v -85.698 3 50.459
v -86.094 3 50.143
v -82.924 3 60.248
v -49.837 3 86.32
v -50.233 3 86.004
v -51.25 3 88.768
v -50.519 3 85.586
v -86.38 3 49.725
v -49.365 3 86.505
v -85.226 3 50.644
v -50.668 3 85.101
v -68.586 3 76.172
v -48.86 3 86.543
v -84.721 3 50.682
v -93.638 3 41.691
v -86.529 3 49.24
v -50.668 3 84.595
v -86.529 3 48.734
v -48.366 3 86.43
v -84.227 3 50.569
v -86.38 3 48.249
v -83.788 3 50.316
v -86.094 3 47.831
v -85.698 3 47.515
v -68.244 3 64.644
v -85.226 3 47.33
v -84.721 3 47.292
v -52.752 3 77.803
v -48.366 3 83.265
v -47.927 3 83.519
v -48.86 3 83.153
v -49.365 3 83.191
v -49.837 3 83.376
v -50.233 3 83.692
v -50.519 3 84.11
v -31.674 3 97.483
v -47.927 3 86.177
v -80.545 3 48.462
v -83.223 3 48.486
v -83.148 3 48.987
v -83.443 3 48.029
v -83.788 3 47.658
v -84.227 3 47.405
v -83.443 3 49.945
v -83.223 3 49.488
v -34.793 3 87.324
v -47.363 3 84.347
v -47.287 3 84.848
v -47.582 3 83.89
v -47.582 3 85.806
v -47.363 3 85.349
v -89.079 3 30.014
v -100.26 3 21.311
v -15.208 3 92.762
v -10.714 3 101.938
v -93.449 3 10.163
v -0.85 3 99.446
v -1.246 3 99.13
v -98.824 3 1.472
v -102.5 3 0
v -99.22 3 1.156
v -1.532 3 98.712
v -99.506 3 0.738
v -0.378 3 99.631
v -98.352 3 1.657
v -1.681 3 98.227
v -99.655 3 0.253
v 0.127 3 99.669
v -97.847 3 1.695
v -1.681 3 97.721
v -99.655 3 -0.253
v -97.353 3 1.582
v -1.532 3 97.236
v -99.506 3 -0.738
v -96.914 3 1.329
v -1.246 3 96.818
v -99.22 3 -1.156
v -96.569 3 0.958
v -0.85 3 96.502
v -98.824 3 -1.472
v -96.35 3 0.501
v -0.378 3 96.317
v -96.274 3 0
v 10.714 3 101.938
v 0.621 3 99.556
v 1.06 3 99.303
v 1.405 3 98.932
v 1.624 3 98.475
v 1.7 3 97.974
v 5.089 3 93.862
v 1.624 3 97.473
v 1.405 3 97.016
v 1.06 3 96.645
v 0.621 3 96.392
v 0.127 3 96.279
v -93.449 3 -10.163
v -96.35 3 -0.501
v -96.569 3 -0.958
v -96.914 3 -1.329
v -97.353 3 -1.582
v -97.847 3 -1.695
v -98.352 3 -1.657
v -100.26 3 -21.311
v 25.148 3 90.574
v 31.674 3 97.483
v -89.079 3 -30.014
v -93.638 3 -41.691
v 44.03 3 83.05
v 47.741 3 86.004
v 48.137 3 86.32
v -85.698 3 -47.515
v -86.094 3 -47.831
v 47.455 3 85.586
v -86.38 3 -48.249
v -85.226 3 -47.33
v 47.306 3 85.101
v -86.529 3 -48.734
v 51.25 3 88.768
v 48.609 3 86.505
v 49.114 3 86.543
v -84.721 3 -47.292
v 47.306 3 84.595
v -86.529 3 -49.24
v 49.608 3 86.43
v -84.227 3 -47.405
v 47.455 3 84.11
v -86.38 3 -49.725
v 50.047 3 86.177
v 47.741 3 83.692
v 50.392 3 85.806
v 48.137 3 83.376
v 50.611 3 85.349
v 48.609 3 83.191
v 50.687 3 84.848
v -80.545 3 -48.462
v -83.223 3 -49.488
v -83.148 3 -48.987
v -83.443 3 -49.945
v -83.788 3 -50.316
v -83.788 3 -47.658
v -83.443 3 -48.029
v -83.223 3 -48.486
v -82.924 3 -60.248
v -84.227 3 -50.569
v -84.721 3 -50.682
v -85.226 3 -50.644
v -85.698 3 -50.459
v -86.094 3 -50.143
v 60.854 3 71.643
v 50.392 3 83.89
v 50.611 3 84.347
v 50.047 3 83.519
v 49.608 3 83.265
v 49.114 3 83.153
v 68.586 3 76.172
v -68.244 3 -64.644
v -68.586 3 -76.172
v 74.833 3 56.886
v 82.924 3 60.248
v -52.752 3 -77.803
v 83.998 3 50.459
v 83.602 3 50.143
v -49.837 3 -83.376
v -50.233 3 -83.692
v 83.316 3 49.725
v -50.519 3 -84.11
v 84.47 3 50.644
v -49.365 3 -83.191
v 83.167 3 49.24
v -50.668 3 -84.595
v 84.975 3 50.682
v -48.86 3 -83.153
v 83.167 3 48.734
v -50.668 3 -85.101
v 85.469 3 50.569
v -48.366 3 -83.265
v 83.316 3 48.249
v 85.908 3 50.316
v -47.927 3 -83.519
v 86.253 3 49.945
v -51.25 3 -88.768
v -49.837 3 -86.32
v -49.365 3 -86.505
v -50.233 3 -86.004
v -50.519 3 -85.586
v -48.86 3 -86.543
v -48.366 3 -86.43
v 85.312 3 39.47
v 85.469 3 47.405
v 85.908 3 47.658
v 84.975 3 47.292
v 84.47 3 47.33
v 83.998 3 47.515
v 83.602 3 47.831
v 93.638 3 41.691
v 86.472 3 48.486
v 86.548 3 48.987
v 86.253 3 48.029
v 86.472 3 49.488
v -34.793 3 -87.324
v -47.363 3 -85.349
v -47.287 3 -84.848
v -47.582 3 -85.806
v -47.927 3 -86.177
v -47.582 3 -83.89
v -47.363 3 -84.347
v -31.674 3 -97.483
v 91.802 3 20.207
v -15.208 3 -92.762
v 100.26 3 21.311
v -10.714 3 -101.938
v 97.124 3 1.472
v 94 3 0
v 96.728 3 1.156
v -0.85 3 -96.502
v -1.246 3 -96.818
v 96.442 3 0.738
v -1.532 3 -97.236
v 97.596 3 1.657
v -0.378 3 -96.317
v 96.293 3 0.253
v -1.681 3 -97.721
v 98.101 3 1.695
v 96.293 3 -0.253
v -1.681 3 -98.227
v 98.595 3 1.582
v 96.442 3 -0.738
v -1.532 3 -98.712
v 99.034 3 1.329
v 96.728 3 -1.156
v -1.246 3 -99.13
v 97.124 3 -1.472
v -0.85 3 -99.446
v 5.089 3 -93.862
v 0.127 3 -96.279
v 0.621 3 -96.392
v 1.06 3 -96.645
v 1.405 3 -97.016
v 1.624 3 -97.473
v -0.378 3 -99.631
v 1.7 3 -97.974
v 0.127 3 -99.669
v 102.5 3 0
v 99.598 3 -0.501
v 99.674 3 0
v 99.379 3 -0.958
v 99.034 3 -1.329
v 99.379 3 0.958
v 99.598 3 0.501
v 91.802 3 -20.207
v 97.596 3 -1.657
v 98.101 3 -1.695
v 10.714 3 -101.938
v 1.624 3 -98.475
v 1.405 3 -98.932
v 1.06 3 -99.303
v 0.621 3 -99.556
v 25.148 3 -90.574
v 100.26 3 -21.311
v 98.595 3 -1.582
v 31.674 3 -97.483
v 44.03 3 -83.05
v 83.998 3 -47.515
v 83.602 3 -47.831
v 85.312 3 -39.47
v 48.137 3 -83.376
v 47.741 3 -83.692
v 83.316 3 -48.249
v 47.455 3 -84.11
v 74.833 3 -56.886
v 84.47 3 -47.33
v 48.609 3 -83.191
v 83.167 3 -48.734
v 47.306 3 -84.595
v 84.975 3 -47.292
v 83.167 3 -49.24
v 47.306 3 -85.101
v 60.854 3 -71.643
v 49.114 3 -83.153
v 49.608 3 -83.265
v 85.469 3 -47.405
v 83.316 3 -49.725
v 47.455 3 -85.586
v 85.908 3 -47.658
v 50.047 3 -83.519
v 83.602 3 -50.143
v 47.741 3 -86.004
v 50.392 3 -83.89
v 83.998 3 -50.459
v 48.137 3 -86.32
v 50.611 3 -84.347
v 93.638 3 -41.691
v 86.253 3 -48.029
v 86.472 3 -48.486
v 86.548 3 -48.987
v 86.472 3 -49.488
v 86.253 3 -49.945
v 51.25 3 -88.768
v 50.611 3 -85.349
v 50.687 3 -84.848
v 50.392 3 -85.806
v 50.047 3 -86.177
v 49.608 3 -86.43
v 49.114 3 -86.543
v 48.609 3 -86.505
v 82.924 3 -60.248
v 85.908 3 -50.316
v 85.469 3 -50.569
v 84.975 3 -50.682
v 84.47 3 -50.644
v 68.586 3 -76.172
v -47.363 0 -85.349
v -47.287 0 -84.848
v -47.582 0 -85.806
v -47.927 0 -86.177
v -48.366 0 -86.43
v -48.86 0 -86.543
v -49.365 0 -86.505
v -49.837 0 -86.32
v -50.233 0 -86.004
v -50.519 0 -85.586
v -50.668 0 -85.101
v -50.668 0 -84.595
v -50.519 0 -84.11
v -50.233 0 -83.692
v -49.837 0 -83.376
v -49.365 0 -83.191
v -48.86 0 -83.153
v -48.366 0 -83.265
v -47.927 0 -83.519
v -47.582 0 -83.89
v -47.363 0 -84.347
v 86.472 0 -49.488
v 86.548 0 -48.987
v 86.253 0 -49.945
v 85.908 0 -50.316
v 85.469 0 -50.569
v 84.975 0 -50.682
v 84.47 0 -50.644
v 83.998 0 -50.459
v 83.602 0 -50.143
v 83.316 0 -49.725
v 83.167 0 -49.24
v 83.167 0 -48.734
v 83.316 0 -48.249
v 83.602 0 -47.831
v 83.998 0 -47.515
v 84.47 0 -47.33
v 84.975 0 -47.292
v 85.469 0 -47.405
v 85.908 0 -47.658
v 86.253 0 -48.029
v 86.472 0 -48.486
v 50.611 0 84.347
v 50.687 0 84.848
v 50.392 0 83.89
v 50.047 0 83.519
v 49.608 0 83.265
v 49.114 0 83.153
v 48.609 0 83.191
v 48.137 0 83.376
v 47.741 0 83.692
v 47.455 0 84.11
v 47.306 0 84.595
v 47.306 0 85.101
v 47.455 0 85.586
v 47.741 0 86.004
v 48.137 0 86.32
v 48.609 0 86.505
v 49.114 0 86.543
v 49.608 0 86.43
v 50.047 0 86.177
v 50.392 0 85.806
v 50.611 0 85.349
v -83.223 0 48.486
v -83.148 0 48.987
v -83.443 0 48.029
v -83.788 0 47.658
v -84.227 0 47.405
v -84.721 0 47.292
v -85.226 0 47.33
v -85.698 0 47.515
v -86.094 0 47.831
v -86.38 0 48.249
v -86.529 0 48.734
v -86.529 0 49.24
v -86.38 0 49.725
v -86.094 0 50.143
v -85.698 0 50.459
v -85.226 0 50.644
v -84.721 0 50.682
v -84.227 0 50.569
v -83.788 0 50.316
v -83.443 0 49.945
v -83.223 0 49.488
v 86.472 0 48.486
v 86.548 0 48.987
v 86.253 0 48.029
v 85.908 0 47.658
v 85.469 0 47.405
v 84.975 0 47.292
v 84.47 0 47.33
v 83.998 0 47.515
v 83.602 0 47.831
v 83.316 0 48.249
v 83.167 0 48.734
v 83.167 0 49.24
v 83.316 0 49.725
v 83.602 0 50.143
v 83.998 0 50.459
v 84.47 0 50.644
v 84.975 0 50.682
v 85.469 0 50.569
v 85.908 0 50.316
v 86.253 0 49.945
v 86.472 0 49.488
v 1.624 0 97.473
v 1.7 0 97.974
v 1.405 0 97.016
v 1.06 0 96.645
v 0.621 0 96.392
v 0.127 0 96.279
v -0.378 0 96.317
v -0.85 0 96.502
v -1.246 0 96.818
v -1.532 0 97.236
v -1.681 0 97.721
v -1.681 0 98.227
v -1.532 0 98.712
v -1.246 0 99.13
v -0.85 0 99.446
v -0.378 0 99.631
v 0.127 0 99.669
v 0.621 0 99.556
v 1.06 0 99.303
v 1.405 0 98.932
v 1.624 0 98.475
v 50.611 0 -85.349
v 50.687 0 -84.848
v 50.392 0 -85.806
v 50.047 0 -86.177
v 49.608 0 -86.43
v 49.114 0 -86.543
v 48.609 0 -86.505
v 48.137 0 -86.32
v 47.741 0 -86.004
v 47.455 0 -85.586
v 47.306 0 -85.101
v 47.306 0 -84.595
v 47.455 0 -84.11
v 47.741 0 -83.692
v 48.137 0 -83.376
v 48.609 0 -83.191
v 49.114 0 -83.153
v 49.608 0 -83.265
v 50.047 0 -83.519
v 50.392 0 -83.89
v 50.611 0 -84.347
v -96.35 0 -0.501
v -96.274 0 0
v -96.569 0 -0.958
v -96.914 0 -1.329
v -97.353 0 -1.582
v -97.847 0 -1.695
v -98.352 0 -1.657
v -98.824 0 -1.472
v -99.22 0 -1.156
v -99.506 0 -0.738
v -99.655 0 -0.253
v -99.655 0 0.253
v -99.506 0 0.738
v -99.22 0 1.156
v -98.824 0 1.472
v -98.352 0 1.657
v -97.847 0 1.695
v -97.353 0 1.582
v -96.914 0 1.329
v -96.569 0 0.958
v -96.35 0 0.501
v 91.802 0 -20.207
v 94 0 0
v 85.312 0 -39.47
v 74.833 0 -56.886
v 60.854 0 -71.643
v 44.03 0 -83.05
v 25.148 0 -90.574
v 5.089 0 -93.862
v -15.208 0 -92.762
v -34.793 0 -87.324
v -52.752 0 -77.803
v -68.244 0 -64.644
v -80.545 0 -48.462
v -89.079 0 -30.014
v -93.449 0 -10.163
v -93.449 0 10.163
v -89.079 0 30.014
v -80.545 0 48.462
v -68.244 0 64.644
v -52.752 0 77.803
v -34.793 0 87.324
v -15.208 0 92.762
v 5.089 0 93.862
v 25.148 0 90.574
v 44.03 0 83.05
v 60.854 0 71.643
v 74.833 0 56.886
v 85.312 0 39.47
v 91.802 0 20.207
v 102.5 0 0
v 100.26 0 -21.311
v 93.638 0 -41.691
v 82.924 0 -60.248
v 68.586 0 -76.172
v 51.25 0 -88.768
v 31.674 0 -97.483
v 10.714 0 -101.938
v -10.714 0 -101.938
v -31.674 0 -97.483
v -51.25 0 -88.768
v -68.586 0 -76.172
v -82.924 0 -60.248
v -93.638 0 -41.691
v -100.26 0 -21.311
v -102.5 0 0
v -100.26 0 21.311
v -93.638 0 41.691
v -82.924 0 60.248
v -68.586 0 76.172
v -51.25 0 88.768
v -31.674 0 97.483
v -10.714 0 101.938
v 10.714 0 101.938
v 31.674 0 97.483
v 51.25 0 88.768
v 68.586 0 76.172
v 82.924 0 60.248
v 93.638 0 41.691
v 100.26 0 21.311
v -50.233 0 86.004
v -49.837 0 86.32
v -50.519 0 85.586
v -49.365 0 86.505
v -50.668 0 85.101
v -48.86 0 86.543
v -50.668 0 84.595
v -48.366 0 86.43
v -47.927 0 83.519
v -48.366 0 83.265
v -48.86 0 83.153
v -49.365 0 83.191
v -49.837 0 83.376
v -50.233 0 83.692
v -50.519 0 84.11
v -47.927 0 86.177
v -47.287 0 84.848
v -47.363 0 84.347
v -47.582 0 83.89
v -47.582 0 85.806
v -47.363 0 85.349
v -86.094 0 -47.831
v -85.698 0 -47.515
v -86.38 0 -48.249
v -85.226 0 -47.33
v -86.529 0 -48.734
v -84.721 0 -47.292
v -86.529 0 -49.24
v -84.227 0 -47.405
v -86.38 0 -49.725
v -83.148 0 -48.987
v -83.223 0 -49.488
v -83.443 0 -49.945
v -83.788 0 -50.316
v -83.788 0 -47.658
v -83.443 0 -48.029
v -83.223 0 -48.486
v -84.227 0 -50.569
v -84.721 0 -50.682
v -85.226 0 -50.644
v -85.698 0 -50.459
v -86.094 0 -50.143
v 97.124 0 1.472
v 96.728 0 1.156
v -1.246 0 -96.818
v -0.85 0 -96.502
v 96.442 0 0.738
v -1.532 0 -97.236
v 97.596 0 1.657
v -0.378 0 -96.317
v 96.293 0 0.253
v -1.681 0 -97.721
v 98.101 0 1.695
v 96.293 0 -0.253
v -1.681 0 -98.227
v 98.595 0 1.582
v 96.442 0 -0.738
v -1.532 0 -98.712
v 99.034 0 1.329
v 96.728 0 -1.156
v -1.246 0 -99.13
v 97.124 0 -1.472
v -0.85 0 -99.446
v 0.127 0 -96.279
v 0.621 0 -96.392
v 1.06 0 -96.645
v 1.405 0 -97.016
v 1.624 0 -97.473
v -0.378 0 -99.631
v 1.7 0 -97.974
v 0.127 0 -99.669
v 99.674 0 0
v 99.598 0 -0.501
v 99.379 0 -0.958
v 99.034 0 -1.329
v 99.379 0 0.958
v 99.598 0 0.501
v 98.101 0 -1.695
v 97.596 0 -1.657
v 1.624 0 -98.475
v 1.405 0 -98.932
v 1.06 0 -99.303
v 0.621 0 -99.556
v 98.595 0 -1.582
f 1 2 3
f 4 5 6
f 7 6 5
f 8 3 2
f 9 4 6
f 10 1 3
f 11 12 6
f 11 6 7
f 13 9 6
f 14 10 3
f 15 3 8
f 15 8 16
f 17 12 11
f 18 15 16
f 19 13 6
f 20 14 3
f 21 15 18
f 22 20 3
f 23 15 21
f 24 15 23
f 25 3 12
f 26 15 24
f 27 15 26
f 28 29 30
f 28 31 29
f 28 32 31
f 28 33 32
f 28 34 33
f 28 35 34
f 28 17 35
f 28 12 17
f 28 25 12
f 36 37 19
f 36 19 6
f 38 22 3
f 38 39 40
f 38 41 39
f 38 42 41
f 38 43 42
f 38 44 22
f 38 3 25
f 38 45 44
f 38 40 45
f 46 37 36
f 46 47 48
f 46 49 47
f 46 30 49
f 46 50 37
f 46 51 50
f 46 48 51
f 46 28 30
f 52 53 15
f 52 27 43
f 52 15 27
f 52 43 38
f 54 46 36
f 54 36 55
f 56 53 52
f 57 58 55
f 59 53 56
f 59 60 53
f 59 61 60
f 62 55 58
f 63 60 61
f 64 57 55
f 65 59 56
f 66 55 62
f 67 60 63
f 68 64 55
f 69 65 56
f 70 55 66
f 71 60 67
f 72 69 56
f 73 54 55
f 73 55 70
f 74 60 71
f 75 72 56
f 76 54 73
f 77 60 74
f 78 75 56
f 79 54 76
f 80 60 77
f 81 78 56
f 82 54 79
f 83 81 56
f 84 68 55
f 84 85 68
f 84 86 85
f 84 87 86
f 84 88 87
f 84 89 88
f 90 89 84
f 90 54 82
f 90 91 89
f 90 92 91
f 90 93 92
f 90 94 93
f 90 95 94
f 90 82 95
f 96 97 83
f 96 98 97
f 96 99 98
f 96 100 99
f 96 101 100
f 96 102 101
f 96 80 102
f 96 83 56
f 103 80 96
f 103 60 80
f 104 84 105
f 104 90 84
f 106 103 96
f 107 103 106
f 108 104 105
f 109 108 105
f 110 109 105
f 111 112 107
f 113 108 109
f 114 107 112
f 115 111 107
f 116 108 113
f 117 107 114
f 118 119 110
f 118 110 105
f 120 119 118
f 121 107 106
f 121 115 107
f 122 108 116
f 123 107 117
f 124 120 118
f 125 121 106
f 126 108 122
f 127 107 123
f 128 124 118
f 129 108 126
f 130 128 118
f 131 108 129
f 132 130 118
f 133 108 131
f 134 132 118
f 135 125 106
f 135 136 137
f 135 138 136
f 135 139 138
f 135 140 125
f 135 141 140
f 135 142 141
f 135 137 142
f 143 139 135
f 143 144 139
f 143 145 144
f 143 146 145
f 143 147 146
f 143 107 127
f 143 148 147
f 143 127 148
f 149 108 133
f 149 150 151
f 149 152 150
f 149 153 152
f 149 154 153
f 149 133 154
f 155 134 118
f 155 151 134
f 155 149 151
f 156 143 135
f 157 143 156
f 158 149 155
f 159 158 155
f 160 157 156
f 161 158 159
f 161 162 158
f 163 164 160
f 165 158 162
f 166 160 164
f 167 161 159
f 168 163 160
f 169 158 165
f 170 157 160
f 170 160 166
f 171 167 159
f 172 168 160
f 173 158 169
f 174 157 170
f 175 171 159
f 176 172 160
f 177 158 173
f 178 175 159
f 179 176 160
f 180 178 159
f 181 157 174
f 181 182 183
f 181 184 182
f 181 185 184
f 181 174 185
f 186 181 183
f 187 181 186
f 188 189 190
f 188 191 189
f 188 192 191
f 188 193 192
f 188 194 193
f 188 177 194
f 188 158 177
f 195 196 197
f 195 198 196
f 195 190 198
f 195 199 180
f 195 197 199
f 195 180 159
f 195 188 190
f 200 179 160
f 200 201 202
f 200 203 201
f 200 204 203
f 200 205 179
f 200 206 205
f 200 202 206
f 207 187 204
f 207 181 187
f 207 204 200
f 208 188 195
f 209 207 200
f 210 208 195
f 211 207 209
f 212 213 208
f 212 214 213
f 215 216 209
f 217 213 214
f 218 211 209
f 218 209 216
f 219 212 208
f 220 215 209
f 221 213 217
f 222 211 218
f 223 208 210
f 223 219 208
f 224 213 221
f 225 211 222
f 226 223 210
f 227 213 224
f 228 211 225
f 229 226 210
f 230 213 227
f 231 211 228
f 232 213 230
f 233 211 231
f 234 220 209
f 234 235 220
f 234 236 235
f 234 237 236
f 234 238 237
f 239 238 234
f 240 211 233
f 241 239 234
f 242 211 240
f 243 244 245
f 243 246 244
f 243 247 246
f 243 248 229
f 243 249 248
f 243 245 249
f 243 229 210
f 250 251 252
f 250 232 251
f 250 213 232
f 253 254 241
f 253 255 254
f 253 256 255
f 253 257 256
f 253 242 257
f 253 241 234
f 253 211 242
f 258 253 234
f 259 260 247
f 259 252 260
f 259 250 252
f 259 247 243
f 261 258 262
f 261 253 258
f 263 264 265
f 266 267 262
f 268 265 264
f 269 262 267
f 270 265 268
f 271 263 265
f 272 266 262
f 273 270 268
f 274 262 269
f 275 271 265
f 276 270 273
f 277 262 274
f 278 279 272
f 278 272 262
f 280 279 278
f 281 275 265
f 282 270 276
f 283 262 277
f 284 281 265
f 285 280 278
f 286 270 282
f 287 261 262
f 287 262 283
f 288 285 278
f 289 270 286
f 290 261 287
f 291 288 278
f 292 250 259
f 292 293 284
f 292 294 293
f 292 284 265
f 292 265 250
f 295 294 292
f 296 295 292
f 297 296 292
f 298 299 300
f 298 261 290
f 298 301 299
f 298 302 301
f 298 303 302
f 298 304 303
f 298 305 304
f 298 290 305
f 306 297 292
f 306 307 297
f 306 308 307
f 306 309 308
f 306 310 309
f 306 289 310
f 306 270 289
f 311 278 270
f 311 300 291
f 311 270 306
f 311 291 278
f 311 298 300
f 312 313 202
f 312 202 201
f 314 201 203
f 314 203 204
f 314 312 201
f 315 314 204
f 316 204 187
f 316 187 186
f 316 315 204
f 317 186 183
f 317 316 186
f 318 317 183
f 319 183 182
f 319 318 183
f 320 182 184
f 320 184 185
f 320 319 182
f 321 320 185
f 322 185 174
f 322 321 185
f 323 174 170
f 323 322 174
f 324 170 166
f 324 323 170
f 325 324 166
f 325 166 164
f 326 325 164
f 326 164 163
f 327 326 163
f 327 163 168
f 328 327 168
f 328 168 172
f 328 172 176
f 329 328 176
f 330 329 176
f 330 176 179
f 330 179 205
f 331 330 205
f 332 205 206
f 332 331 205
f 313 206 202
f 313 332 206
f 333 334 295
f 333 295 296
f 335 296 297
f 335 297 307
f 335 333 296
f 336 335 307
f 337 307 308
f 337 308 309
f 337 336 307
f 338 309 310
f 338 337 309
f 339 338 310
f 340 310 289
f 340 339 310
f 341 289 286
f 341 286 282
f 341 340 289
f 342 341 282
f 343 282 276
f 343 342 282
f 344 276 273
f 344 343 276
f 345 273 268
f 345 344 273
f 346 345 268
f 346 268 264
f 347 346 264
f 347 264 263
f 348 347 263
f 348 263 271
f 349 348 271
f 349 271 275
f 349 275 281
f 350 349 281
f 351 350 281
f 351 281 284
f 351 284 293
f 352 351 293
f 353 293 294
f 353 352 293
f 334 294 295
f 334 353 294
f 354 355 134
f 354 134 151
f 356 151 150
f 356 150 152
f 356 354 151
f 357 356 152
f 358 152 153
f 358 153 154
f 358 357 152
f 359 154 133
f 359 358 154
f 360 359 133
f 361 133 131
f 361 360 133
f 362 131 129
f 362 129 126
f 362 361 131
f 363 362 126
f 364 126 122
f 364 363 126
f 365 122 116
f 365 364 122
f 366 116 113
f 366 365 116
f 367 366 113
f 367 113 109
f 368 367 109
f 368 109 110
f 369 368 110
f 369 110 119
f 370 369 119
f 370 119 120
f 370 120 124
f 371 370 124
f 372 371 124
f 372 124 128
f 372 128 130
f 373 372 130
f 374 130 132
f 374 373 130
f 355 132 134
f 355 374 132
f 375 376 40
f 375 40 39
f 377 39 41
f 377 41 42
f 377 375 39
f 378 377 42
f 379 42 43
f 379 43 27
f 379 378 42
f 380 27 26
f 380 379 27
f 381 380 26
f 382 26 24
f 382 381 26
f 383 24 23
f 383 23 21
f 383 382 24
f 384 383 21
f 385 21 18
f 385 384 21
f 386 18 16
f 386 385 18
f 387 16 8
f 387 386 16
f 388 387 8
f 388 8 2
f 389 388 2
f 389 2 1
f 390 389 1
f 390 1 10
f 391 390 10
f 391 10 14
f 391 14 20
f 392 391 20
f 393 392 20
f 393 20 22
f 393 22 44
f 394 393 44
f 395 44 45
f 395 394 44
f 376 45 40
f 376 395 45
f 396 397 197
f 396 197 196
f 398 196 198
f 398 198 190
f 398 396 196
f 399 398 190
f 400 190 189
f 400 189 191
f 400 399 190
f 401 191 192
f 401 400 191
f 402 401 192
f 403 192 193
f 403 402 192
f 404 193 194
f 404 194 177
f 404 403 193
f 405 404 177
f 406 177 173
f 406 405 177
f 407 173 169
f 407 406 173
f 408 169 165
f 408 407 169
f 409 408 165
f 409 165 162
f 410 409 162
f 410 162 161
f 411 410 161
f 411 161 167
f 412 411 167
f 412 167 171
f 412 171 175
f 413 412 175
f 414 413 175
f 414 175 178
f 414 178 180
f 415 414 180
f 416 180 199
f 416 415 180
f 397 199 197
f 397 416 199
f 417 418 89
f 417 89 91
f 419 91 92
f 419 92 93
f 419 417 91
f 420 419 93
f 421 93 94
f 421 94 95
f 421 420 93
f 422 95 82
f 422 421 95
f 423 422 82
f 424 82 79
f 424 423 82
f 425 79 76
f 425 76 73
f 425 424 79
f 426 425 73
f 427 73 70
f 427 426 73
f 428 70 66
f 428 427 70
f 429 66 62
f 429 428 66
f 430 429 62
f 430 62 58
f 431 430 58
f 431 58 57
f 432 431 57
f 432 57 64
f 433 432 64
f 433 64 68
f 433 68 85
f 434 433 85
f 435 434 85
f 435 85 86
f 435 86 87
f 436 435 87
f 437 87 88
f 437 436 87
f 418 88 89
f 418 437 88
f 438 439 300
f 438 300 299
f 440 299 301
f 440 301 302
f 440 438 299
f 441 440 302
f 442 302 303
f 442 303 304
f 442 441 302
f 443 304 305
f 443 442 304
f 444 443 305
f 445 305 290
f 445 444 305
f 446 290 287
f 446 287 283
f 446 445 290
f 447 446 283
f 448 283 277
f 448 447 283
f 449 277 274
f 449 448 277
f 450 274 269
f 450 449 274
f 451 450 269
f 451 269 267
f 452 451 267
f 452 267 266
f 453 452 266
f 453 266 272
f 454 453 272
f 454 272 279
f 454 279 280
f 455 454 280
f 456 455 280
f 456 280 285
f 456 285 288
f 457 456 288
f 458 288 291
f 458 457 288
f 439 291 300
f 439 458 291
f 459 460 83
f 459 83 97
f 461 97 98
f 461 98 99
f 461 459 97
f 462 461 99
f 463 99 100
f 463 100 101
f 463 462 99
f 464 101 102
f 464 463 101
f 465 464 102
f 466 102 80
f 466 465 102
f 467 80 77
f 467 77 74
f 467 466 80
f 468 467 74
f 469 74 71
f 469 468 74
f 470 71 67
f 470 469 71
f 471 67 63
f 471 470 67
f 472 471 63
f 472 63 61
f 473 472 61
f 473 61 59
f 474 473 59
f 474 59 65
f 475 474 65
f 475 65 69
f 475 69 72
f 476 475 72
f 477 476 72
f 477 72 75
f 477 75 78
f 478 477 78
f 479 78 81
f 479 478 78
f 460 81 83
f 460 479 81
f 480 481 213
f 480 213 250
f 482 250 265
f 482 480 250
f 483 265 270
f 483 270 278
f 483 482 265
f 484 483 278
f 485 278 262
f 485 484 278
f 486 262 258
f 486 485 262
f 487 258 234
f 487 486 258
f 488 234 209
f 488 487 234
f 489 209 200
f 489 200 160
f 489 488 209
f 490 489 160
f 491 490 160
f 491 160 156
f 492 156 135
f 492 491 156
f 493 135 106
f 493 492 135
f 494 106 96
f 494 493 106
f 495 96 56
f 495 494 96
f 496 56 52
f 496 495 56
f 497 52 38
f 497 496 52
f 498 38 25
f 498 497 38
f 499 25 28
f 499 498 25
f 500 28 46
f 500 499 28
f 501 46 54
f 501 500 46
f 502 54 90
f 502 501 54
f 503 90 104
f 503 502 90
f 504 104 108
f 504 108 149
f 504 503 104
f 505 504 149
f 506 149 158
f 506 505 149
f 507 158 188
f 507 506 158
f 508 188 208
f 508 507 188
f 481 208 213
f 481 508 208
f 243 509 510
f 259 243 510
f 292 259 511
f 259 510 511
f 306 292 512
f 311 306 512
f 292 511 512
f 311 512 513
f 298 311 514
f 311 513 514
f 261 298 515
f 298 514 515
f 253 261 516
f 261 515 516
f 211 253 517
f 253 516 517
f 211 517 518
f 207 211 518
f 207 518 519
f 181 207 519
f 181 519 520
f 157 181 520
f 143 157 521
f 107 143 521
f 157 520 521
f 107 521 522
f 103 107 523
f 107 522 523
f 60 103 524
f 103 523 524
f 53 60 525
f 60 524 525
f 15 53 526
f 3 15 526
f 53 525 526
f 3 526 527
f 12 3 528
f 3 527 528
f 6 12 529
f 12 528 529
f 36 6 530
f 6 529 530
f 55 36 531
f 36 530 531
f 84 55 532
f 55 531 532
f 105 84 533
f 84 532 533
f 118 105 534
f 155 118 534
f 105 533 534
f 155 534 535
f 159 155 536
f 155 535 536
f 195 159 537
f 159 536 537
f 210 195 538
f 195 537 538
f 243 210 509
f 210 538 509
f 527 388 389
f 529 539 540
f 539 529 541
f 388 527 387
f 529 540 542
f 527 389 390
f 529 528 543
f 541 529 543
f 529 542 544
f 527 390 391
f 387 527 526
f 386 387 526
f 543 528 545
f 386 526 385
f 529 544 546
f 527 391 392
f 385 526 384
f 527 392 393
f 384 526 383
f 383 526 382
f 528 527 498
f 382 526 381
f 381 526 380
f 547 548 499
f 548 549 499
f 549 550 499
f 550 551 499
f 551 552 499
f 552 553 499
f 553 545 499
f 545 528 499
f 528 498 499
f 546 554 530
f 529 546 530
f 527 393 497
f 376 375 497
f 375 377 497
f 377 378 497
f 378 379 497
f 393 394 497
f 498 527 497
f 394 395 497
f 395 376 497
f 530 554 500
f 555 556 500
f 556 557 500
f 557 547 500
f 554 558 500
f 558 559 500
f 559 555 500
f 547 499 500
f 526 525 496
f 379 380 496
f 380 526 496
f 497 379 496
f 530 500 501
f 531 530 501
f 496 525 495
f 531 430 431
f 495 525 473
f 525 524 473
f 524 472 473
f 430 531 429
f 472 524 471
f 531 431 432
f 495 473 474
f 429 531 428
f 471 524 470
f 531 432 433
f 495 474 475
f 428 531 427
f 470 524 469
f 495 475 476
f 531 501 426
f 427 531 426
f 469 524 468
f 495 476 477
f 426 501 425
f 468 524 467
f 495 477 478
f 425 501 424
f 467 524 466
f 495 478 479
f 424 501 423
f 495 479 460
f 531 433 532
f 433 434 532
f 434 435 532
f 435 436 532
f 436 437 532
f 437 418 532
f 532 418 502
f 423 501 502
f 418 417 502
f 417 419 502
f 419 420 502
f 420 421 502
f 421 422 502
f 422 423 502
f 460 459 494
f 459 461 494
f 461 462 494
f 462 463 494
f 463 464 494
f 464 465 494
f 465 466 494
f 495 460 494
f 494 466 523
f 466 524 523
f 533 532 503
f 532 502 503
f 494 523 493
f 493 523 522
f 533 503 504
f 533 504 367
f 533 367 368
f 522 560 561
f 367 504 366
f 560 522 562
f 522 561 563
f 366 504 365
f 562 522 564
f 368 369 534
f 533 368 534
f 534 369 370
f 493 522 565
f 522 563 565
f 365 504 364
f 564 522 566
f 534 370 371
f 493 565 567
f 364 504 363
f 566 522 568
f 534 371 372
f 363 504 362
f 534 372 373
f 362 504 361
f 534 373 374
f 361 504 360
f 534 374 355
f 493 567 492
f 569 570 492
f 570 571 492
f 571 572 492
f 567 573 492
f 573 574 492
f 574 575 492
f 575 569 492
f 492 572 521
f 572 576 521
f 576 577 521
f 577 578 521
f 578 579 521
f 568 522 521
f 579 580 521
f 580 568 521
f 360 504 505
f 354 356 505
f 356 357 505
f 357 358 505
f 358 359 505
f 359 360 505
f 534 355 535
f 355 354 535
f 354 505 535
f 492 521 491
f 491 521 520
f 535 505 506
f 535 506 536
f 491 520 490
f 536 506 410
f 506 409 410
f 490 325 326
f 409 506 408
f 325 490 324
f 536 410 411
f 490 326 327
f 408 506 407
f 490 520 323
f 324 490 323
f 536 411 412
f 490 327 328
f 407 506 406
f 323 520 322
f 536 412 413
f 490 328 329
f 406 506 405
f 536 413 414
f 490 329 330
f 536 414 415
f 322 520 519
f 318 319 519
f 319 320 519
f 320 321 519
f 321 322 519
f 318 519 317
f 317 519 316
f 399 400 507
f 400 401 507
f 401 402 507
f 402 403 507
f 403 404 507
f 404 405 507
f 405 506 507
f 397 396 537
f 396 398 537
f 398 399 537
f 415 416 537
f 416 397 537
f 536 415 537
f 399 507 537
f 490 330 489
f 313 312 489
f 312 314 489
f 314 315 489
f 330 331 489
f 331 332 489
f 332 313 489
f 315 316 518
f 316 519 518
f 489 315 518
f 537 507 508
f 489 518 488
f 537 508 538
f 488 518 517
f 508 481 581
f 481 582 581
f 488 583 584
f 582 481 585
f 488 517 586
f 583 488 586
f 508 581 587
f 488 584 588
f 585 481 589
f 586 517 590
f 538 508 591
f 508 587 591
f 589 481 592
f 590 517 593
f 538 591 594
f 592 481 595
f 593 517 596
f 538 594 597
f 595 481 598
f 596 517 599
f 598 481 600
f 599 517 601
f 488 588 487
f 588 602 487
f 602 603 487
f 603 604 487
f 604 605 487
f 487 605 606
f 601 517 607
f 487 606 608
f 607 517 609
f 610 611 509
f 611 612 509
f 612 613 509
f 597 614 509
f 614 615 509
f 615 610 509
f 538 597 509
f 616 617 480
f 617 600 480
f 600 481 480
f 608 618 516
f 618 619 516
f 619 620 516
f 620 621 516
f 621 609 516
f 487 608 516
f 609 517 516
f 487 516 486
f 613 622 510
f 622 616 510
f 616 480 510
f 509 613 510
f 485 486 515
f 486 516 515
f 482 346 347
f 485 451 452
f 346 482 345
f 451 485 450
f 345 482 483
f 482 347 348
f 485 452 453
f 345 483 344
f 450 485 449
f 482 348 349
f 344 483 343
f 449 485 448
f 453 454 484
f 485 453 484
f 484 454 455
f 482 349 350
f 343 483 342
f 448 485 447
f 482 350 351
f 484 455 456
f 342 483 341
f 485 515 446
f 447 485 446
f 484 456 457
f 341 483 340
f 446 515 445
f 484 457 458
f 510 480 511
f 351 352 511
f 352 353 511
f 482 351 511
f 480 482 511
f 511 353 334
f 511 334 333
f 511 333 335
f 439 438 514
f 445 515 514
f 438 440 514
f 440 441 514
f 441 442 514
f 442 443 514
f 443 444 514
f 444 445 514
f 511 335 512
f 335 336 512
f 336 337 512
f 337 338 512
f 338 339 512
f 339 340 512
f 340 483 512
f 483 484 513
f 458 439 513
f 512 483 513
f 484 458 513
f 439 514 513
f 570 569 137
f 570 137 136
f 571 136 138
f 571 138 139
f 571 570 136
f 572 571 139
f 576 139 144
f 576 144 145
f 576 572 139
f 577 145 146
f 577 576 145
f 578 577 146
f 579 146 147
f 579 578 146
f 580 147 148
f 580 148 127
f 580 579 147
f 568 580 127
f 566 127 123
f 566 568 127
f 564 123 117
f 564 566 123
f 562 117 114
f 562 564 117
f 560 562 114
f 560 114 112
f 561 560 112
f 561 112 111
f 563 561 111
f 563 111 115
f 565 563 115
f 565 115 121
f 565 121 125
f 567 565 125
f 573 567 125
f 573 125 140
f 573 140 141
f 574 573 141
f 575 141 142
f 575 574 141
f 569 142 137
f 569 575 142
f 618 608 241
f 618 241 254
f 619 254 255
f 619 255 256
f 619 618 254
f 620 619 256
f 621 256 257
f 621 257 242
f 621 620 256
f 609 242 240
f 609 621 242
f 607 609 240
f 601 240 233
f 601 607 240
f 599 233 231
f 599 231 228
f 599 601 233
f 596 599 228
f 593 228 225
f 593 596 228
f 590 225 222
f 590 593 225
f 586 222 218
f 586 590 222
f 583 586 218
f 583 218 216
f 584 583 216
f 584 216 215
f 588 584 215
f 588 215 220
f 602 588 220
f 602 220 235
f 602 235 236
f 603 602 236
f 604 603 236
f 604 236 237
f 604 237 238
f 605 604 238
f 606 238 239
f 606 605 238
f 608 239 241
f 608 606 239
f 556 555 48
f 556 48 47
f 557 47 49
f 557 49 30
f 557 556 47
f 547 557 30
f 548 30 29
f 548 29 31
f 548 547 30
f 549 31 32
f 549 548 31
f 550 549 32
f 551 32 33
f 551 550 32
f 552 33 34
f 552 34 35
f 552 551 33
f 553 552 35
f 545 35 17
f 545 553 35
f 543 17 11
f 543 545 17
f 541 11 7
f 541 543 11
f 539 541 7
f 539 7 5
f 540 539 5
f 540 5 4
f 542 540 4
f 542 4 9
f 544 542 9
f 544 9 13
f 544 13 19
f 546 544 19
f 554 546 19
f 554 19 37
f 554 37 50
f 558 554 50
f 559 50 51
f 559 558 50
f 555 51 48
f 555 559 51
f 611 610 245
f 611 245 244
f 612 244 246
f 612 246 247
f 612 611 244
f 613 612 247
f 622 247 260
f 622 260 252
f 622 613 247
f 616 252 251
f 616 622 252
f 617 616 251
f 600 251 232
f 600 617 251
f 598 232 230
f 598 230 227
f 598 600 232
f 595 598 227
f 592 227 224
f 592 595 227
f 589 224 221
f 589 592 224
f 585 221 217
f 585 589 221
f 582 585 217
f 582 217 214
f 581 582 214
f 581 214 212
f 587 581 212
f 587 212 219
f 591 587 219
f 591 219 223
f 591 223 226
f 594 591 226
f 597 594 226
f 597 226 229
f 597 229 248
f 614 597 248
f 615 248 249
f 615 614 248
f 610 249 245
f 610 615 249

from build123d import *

# Parameters (mm, degrees)
SKETCH1_R           = 102.5
SKETCH1_R_2         = 94
SKETCH1_R_3         = 1.7
BOSS_EXTRUDE1_DEPTH = 3


with BuildPart() as part:
    # Sketch1 → Boss-Extrude1 (new body)
    with BuildSketch(Plane(origin=(0, 0, 0), x_dir=(1, 0, 0), z_dir=(0, 1, 0))):
        Circle(SKETCH1_R)
        Circle(SKETCH1_R_2, mode=Mode.SUBTRACT)
        with Locations((0, 97.974)):
            Circle(SKETCH1_R_3, mode=Mode.SUBTRACT)
        with Locations((48.987, 84.84797291)):
            Circle(SKETCH1_R_3, mode=Mode.SUBTRACT)
        with Locations((84.84797291, 48.987)):
            Circle(SKETCH1_R_3, mode=Mode.SUBTRACT)
        with Locations((97.974, 0)):
            Circle(SKETCH1_R_3, mode=Mode.SUBTRACT)
        with Locations((84.84797291, -48.987)):
            Circle(SKETCH1_R_3, mode=Mode.SUBTRACT)
        with Locations((48.987, -84.84797291)):
            Circle(SKETCH1_R_3, mode=Mode.SUBTRACT)
        with Locations((0, -97.974)):
            Circle(SKETCH1_R_3, mode=Mode.SUBTRACT)
        with Locations((-48.987, -84.84797291)):
            Circle(SKETCH1_R_3, mode=Mode.SUBTRACT)
        with Locations((-84.84797291, -48.987)):
            Circle(SKETCH1_R_3, mode=Mode.SUBTRACT)
        with Locations((-97.974, 0)):
            Circle(SKETCH1_R_3, mode=Mode.SUBTRACT)
        with Locations((-84.84797291, 48.987)):
            Circle(SKETCH1_R_3, mode=Mode.SUBTRACT)
        with Locations((-48.987, 84.84797291)):
            Circle(SKETCH1_R_3, mode=Mode.SUBTRACT)
    extrude(amount=BOSS_EXTRUDE1_DEPTH)


solid = part.part
